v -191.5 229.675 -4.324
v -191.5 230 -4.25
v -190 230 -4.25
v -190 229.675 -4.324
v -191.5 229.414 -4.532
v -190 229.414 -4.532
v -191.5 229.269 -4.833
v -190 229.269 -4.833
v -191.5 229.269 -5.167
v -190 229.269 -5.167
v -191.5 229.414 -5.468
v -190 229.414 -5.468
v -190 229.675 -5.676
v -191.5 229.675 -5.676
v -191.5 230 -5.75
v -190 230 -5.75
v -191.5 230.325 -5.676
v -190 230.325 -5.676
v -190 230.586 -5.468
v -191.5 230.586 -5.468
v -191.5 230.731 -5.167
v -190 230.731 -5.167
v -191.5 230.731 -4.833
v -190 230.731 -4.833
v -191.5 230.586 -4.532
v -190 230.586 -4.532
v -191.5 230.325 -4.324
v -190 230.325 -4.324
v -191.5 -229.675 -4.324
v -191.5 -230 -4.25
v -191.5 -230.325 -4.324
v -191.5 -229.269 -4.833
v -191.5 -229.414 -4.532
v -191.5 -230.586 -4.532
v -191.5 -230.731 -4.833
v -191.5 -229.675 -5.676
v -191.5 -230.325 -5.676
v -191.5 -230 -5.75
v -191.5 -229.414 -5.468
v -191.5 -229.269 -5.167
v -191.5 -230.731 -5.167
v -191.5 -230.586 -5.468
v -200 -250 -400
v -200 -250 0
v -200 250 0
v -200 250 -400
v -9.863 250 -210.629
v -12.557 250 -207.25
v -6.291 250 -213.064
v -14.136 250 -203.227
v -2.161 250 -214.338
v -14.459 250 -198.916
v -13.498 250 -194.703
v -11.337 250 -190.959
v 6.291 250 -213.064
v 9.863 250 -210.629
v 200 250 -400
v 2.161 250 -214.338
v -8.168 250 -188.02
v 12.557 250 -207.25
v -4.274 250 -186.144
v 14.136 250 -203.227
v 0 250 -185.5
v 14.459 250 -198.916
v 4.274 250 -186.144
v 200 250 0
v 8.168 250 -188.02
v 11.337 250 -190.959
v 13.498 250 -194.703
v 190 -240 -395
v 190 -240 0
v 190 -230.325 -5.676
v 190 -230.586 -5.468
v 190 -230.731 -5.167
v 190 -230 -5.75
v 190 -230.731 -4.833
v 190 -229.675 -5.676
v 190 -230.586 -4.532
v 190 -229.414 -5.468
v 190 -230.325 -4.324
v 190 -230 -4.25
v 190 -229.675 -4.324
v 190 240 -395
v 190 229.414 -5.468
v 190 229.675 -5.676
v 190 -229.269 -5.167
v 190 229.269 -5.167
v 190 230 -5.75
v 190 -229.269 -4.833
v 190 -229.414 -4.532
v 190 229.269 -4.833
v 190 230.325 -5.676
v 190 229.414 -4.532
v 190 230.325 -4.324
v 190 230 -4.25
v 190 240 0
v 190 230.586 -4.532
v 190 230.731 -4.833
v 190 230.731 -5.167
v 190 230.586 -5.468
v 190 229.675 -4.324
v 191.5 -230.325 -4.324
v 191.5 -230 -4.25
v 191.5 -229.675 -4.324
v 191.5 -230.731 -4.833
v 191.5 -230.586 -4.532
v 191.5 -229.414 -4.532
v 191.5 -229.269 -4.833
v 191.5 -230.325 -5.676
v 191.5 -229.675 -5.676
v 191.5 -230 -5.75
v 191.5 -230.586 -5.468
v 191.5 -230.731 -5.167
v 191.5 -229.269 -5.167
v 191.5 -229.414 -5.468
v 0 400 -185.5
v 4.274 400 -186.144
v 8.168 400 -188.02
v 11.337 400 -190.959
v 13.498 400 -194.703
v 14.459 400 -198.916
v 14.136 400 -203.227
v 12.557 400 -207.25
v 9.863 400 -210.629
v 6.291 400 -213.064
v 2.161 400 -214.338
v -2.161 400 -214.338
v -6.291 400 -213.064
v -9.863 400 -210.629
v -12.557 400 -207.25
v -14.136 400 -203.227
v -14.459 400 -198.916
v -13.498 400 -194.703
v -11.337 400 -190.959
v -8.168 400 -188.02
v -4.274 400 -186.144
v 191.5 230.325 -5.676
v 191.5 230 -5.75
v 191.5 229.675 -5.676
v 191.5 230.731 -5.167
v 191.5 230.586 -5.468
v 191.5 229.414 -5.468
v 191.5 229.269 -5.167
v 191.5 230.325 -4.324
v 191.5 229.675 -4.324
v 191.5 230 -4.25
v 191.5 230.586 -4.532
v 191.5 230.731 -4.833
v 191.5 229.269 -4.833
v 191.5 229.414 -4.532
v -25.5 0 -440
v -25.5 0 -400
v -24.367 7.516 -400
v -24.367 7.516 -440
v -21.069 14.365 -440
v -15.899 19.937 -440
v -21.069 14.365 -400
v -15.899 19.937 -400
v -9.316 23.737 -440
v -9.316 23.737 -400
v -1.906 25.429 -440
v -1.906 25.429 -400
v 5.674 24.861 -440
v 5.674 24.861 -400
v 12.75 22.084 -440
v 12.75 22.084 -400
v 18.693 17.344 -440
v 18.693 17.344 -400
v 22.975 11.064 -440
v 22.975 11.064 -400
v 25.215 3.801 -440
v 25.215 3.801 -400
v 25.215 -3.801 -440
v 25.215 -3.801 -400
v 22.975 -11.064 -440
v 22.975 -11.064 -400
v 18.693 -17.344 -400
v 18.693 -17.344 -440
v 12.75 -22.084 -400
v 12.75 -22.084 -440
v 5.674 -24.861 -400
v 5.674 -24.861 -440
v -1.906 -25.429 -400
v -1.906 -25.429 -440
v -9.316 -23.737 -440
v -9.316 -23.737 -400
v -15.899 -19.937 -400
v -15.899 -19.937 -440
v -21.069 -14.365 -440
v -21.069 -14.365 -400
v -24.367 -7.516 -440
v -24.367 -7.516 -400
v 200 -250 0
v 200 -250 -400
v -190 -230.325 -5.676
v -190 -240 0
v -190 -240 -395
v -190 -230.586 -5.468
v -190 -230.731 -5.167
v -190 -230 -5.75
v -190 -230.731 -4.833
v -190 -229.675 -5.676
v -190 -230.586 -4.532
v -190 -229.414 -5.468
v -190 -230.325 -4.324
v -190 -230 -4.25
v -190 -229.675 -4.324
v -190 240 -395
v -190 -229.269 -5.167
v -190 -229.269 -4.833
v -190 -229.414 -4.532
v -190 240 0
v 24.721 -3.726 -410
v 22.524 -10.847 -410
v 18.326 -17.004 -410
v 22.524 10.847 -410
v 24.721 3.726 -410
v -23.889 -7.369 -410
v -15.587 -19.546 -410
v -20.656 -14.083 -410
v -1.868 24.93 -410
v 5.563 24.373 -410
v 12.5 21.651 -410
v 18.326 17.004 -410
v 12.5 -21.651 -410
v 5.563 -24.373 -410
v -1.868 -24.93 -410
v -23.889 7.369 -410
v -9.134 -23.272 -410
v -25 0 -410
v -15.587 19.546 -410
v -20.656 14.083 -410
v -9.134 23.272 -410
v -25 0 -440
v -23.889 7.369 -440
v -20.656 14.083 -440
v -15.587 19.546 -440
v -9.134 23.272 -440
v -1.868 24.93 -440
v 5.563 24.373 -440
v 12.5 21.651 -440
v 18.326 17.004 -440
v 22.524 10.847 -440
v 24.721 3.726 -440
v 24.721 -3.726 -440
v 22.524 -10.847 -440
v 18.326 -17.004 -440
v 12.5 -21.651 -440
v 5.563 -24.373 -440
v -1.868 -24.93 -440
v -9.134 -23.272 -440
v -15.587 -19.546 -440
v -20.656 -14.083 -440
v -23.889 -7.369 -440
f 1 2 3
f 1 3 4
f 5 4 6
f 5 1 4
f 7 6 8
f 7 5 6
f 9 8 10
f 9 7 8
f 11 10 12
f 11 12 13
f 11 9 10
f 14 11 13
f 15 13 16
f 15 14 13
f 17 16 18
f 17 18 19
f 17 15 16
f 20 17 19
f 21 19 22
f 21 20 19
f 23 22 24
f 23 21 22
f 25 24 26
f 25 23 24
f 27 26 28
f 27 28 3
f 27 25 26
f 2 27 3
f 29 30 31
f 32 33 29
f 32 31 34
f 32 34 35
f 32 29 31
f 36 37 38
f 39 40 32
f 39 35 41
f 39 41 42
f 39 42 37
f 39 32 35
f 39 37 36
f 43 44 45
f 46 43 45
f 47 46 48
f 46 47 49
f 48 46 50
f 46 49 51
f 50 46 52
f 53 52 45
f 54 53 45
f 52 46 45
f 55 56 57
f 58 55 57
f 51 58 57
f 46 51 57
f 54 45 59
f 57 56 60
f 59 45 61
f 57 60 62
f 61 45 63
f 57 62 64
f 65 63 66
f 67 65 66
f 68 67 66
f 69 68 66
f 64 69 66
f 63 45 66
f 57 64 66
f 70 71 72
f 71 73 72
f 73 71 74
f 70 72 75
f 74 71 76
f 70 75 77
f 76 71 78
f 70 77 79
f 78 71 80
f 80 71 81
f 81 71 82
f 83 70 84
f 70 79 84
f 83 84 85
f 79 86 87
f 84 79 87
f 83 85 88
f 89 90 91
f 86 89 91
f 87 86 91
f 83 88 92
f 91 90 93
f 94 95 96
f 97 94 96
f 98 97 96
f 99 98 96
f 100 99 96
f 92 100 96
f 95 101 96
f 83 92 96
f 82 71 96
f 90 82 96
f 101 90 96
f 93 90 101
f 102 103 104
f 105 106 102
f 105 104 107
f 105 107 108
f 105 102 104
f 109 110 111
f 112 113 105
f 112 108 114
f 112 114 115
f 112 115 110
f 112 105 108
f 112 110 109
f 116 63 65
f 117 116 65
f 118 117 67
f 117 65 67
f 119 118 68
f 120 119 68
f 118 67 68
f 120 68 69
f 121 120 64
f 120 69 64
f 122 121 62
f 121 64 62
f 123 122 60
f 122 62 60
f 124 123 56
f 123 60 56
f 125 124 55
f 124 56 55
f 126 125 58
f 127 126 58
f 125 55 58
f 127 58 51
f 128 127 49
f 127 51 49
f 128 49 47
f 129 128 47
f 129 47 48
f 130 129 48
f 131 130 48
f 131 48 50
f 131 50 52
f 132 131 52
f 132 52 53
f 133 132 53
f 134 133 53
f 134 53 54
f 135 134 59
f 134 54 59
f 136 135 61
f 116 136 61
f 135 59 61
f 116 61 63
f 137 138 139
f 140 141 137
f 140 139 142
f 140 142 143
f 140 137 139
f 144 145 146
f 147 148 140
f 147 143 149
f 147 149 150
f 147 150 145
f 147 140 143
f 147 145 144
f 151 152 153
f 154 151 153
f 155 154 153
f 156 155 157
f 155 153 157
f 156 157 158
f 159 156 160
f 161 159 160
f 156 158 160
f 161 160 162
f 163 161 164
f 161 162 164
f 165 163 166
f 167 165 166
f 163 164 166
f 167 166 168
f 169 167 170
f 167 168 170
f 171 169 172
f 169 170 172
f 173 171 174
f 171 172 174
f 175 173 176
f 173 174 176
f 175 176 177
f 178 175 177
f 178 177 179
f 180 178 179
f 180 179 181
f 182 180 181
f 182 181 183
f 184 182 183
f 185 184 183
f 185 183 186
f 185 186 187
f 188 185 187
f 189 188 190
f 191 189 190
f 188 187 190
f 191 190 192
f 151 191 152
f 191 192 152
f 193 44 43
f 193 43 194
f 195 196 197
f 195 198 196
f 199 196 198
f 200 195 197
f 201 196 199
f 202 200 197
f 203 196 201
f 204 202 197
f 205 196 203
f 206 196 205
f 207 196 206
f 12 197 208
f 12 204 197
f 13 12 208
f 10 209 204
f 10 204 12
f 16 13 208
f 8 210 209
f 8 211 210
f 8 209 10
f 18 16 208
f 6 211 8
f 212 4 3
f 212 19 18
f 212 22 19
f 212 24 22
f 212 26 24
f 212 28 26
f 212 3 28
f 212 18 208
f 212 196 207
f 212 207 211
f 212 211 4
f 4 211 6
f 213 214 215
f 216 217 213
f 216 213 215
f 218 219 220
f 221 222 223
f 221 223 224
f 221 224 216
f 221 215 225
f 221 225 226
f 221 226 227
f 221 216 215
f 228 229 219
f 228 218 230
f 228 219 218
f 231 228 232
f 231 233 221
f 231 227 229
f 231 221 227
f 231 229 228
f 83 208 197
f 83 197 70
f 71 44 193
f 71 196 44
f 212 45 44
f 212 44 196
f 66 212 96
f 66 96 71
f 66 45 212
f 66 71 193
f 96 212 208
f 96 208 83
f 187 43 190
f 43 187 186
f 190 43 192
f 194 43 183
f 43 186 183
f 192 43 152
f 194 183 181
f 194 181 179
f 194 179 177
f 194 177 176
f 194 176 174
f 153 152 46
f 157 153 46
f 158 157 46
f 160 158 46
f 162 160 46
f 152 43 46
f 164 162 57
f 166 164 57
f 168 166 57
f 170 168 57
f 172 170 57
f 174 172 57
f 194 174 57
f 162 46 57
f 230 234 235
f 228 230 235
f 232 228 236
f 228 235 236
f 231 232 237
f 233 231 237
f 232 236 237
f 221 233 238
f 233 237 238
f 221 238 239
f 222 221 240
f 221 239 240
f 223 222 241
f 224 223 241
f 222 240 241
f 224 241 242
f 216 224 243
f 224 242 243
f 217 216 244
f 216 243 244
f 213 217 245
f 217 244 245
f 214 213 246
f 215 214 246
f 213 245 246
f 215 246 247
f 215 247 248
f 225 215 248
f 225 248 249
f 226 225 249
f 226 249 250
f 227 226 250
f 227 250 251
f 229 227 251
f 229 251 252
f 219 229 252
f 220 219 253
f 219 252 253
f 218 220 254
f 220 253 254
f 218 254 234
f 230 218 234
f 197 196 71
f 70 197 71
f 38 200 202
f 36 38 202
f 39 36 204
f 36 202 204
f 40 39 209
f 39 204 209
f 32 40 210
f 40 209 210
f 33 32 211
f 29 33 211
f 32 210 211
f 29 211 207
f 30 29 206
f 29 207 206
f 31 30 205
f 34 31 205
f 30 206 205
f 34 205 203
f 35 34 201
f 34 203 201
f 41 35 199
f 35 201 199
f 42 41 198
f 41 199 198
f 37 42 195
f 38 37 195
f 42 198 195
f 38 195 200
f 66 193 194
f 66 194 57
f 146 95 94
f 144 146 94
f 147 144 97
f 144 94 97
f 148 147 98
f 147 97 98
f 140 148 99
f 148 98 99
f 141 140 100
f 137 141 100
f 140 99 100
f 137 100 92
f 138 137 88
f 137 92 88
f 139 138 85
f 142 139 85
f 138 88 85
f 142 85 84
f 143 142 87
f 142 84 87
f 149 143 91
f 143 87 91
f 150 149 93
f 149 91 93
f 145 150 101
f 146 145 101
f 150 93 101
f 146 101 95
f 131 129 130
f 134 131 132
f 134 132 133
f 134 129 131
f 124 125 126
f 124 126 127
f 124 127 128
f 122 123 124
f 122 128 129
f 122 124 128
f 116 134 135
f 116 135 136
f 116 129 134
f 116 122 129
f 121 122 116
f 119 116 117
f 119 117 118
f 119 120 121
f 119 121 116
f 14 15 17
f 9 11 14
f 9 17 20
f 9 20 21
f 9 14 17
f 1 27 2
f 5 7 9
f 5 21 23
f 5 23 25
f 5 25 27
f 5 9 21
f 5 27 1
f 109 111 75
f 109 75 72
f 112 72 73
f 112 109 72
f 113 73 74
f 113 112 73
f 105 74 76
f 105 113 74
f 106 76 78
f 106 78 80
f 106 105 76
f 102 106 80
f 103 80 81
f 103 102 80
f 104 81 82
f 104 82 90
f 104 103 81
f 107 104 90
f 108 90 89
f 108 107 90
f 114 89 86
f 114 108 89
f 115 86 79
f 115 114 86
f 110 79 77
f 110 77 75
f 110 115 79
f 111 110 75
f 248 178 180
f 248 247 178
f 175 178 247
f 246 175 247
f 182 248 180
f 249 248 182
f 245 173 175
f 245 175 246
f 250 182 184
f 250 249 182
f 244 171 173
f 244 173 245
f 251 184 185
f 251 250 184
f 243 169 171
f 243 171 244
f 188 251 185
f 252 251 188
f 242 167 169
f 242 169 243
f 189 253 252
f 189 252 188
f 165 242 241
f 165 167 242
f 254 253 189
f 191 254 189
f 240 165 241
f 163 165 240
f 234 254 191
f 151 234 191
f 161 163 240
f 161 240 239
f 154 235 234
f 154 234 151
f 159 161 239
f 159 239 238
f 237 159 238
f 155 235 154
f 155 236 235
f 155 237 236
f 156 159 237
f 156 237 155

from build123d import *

# Parameters (mm, degrees)
CROQUIS2_W              = 400
CROQUIS2_H              = 500
SALIENTE_EXTRUIR1_DEPTH = 400
CROQUIS3_W              = 380
CROQUIS3_H              = 480
CORTAR_EXTRUIR1_DEPTH   = 395
CROQUIS4_R              = 25.5
SALIENTE_EXTRUIR4_DEPTH = 40
CROQUIS5_R              = 25
CORTAR_EXTRUIR2_DEPTH   = 30
CROQUIS6_R              = 14.5
SALIENTE_EXTRUIR5_DEPTH = 150
CROQUIS9_R              = 0.75
CORTAR_EXTRUIR4_DEPTH   = 1.5
CORTAR_EXTRUIR5_START   = -1.5
CROQUIS10_R             = 0.75
CORTAR_EXTRUIR5_DEPTH   = 1.5
CROQUIS12_R             = 0.75
CORTAR_EXTRUIR6_DEPTH   = 1.5
CORTAR_EXTRUIR7_START   = -1.5
CROQUIS13_R             = 0.75
CORTAR_EXTRUIR7_DEPTH   = 1.5


with BuildPart() as part:
    # Croquis2 → Saliente-Extruir1 (new body)
    with BuildSketch(Plane.XY):
        Rectangle(CROQUIS2_W, CROQUIS2_H)
    extrude(amount=-SALIENTE_EXTRUIR1_DEPTH)

    # Croquis3 → Cortar-Extruir1 (cut)
    with BuildSketch(Plane.XY):
        Rectangle(CROQUIS3_W, CROQUIS3_H)
    extrude(amount=-CORTAR_EXTRUIR1_DEPTH, mode=Mode.SUBTRACT)

    # Croquis4 → Saliente-Extruir4 (add)
    with BuildSketch(Plane(origin=(0, 0, -400), x_dir=(-1, 0, 0), z_dir=(0, 0, -1))):
        Circle(CROQUIS4_R)
    extrude(amount=SALIENTE_EXTRUIR4_DEPTH)

    # Croquis5 → Cortar-Extruir2 (cut)
    with BuildSketch(Plane(origin=(0, 0, -440), x_dir=(-1, 0, 0), z_dir=(0, 0, -1))):
        Circle(CROQUIS5_R)
    extrude(amount=-CORTAR_EXTRUIR2_DEPTH, mode=Mode.SUBTRACT)

    # Croquis6 → Saliente-Extruir5 (add)
    with BuildSketch(Plane(origin=(0, 250, 0), x_dir=(1, 0, 0), z_dir=(0, 1, 0))):
        with Locations(Location((0, 200, 0), (0, 0, 270))):
            Circle(CROQUIS6_R)
    extrude(amount=SALIENTE_EXTRUIR5_DEPTH)

    # Croquis9 → Cortar-Extruir4 (cut)
    with BuildSketch(Plane.ZY.offset(-190)):
        with Locations((-5, 230)):
            Circle(CROQUIS9_R)
    extrude(amount=-CORTAR_EXTRUIR4_DEPTH, mode=Mode.SUBTRACT)

    # Croquis10 → Cortar-Extruir5 (cut)
    with BuildSketch(Plane(origin=(-190, 0, 0), x_dir=(0, 0, -1), z_dir=(1, 0, 0)).offset(CORTAR_EXTRUIR5_START)):
        with Locations(Location((5, 230, 0), (0, 0, 180))):
            Circle(CROQUIS10_R)
    extrude(amount=CORTAR_EXTRUIR5_DEPTH, mode=Mode.SUBTRACT)

    # Croquis12 → Cortar-Extruir6 (cut)
    with BuildSketch(Plane(origin=(-190, 0, 0), x_dir=(0, 0, -1), z_dir=(1, 0, 0))):
        with Locations((5, -230)):
            Circle(CROQUIS12_R)
    extrude(amount=-CORTAR_EXTRUIR6_DEPTH, mode=Mode.SUBTRACT)

    # Croquis13 → Cortar-Extruir7 (cut)
    with BuildSketch(Plane.ZY.offset(-190).offset(CORTAR_EXTRUIR7_START)):
        with Locations(Location((-5, -230, 0), (0, 0, 180))):
            Circle(CROQUIS13_R)
    extrude(amount=CORTAR_EXTRUIR7_DEPTH, mode=Mode.SUBTRACT)


solid = part.part
